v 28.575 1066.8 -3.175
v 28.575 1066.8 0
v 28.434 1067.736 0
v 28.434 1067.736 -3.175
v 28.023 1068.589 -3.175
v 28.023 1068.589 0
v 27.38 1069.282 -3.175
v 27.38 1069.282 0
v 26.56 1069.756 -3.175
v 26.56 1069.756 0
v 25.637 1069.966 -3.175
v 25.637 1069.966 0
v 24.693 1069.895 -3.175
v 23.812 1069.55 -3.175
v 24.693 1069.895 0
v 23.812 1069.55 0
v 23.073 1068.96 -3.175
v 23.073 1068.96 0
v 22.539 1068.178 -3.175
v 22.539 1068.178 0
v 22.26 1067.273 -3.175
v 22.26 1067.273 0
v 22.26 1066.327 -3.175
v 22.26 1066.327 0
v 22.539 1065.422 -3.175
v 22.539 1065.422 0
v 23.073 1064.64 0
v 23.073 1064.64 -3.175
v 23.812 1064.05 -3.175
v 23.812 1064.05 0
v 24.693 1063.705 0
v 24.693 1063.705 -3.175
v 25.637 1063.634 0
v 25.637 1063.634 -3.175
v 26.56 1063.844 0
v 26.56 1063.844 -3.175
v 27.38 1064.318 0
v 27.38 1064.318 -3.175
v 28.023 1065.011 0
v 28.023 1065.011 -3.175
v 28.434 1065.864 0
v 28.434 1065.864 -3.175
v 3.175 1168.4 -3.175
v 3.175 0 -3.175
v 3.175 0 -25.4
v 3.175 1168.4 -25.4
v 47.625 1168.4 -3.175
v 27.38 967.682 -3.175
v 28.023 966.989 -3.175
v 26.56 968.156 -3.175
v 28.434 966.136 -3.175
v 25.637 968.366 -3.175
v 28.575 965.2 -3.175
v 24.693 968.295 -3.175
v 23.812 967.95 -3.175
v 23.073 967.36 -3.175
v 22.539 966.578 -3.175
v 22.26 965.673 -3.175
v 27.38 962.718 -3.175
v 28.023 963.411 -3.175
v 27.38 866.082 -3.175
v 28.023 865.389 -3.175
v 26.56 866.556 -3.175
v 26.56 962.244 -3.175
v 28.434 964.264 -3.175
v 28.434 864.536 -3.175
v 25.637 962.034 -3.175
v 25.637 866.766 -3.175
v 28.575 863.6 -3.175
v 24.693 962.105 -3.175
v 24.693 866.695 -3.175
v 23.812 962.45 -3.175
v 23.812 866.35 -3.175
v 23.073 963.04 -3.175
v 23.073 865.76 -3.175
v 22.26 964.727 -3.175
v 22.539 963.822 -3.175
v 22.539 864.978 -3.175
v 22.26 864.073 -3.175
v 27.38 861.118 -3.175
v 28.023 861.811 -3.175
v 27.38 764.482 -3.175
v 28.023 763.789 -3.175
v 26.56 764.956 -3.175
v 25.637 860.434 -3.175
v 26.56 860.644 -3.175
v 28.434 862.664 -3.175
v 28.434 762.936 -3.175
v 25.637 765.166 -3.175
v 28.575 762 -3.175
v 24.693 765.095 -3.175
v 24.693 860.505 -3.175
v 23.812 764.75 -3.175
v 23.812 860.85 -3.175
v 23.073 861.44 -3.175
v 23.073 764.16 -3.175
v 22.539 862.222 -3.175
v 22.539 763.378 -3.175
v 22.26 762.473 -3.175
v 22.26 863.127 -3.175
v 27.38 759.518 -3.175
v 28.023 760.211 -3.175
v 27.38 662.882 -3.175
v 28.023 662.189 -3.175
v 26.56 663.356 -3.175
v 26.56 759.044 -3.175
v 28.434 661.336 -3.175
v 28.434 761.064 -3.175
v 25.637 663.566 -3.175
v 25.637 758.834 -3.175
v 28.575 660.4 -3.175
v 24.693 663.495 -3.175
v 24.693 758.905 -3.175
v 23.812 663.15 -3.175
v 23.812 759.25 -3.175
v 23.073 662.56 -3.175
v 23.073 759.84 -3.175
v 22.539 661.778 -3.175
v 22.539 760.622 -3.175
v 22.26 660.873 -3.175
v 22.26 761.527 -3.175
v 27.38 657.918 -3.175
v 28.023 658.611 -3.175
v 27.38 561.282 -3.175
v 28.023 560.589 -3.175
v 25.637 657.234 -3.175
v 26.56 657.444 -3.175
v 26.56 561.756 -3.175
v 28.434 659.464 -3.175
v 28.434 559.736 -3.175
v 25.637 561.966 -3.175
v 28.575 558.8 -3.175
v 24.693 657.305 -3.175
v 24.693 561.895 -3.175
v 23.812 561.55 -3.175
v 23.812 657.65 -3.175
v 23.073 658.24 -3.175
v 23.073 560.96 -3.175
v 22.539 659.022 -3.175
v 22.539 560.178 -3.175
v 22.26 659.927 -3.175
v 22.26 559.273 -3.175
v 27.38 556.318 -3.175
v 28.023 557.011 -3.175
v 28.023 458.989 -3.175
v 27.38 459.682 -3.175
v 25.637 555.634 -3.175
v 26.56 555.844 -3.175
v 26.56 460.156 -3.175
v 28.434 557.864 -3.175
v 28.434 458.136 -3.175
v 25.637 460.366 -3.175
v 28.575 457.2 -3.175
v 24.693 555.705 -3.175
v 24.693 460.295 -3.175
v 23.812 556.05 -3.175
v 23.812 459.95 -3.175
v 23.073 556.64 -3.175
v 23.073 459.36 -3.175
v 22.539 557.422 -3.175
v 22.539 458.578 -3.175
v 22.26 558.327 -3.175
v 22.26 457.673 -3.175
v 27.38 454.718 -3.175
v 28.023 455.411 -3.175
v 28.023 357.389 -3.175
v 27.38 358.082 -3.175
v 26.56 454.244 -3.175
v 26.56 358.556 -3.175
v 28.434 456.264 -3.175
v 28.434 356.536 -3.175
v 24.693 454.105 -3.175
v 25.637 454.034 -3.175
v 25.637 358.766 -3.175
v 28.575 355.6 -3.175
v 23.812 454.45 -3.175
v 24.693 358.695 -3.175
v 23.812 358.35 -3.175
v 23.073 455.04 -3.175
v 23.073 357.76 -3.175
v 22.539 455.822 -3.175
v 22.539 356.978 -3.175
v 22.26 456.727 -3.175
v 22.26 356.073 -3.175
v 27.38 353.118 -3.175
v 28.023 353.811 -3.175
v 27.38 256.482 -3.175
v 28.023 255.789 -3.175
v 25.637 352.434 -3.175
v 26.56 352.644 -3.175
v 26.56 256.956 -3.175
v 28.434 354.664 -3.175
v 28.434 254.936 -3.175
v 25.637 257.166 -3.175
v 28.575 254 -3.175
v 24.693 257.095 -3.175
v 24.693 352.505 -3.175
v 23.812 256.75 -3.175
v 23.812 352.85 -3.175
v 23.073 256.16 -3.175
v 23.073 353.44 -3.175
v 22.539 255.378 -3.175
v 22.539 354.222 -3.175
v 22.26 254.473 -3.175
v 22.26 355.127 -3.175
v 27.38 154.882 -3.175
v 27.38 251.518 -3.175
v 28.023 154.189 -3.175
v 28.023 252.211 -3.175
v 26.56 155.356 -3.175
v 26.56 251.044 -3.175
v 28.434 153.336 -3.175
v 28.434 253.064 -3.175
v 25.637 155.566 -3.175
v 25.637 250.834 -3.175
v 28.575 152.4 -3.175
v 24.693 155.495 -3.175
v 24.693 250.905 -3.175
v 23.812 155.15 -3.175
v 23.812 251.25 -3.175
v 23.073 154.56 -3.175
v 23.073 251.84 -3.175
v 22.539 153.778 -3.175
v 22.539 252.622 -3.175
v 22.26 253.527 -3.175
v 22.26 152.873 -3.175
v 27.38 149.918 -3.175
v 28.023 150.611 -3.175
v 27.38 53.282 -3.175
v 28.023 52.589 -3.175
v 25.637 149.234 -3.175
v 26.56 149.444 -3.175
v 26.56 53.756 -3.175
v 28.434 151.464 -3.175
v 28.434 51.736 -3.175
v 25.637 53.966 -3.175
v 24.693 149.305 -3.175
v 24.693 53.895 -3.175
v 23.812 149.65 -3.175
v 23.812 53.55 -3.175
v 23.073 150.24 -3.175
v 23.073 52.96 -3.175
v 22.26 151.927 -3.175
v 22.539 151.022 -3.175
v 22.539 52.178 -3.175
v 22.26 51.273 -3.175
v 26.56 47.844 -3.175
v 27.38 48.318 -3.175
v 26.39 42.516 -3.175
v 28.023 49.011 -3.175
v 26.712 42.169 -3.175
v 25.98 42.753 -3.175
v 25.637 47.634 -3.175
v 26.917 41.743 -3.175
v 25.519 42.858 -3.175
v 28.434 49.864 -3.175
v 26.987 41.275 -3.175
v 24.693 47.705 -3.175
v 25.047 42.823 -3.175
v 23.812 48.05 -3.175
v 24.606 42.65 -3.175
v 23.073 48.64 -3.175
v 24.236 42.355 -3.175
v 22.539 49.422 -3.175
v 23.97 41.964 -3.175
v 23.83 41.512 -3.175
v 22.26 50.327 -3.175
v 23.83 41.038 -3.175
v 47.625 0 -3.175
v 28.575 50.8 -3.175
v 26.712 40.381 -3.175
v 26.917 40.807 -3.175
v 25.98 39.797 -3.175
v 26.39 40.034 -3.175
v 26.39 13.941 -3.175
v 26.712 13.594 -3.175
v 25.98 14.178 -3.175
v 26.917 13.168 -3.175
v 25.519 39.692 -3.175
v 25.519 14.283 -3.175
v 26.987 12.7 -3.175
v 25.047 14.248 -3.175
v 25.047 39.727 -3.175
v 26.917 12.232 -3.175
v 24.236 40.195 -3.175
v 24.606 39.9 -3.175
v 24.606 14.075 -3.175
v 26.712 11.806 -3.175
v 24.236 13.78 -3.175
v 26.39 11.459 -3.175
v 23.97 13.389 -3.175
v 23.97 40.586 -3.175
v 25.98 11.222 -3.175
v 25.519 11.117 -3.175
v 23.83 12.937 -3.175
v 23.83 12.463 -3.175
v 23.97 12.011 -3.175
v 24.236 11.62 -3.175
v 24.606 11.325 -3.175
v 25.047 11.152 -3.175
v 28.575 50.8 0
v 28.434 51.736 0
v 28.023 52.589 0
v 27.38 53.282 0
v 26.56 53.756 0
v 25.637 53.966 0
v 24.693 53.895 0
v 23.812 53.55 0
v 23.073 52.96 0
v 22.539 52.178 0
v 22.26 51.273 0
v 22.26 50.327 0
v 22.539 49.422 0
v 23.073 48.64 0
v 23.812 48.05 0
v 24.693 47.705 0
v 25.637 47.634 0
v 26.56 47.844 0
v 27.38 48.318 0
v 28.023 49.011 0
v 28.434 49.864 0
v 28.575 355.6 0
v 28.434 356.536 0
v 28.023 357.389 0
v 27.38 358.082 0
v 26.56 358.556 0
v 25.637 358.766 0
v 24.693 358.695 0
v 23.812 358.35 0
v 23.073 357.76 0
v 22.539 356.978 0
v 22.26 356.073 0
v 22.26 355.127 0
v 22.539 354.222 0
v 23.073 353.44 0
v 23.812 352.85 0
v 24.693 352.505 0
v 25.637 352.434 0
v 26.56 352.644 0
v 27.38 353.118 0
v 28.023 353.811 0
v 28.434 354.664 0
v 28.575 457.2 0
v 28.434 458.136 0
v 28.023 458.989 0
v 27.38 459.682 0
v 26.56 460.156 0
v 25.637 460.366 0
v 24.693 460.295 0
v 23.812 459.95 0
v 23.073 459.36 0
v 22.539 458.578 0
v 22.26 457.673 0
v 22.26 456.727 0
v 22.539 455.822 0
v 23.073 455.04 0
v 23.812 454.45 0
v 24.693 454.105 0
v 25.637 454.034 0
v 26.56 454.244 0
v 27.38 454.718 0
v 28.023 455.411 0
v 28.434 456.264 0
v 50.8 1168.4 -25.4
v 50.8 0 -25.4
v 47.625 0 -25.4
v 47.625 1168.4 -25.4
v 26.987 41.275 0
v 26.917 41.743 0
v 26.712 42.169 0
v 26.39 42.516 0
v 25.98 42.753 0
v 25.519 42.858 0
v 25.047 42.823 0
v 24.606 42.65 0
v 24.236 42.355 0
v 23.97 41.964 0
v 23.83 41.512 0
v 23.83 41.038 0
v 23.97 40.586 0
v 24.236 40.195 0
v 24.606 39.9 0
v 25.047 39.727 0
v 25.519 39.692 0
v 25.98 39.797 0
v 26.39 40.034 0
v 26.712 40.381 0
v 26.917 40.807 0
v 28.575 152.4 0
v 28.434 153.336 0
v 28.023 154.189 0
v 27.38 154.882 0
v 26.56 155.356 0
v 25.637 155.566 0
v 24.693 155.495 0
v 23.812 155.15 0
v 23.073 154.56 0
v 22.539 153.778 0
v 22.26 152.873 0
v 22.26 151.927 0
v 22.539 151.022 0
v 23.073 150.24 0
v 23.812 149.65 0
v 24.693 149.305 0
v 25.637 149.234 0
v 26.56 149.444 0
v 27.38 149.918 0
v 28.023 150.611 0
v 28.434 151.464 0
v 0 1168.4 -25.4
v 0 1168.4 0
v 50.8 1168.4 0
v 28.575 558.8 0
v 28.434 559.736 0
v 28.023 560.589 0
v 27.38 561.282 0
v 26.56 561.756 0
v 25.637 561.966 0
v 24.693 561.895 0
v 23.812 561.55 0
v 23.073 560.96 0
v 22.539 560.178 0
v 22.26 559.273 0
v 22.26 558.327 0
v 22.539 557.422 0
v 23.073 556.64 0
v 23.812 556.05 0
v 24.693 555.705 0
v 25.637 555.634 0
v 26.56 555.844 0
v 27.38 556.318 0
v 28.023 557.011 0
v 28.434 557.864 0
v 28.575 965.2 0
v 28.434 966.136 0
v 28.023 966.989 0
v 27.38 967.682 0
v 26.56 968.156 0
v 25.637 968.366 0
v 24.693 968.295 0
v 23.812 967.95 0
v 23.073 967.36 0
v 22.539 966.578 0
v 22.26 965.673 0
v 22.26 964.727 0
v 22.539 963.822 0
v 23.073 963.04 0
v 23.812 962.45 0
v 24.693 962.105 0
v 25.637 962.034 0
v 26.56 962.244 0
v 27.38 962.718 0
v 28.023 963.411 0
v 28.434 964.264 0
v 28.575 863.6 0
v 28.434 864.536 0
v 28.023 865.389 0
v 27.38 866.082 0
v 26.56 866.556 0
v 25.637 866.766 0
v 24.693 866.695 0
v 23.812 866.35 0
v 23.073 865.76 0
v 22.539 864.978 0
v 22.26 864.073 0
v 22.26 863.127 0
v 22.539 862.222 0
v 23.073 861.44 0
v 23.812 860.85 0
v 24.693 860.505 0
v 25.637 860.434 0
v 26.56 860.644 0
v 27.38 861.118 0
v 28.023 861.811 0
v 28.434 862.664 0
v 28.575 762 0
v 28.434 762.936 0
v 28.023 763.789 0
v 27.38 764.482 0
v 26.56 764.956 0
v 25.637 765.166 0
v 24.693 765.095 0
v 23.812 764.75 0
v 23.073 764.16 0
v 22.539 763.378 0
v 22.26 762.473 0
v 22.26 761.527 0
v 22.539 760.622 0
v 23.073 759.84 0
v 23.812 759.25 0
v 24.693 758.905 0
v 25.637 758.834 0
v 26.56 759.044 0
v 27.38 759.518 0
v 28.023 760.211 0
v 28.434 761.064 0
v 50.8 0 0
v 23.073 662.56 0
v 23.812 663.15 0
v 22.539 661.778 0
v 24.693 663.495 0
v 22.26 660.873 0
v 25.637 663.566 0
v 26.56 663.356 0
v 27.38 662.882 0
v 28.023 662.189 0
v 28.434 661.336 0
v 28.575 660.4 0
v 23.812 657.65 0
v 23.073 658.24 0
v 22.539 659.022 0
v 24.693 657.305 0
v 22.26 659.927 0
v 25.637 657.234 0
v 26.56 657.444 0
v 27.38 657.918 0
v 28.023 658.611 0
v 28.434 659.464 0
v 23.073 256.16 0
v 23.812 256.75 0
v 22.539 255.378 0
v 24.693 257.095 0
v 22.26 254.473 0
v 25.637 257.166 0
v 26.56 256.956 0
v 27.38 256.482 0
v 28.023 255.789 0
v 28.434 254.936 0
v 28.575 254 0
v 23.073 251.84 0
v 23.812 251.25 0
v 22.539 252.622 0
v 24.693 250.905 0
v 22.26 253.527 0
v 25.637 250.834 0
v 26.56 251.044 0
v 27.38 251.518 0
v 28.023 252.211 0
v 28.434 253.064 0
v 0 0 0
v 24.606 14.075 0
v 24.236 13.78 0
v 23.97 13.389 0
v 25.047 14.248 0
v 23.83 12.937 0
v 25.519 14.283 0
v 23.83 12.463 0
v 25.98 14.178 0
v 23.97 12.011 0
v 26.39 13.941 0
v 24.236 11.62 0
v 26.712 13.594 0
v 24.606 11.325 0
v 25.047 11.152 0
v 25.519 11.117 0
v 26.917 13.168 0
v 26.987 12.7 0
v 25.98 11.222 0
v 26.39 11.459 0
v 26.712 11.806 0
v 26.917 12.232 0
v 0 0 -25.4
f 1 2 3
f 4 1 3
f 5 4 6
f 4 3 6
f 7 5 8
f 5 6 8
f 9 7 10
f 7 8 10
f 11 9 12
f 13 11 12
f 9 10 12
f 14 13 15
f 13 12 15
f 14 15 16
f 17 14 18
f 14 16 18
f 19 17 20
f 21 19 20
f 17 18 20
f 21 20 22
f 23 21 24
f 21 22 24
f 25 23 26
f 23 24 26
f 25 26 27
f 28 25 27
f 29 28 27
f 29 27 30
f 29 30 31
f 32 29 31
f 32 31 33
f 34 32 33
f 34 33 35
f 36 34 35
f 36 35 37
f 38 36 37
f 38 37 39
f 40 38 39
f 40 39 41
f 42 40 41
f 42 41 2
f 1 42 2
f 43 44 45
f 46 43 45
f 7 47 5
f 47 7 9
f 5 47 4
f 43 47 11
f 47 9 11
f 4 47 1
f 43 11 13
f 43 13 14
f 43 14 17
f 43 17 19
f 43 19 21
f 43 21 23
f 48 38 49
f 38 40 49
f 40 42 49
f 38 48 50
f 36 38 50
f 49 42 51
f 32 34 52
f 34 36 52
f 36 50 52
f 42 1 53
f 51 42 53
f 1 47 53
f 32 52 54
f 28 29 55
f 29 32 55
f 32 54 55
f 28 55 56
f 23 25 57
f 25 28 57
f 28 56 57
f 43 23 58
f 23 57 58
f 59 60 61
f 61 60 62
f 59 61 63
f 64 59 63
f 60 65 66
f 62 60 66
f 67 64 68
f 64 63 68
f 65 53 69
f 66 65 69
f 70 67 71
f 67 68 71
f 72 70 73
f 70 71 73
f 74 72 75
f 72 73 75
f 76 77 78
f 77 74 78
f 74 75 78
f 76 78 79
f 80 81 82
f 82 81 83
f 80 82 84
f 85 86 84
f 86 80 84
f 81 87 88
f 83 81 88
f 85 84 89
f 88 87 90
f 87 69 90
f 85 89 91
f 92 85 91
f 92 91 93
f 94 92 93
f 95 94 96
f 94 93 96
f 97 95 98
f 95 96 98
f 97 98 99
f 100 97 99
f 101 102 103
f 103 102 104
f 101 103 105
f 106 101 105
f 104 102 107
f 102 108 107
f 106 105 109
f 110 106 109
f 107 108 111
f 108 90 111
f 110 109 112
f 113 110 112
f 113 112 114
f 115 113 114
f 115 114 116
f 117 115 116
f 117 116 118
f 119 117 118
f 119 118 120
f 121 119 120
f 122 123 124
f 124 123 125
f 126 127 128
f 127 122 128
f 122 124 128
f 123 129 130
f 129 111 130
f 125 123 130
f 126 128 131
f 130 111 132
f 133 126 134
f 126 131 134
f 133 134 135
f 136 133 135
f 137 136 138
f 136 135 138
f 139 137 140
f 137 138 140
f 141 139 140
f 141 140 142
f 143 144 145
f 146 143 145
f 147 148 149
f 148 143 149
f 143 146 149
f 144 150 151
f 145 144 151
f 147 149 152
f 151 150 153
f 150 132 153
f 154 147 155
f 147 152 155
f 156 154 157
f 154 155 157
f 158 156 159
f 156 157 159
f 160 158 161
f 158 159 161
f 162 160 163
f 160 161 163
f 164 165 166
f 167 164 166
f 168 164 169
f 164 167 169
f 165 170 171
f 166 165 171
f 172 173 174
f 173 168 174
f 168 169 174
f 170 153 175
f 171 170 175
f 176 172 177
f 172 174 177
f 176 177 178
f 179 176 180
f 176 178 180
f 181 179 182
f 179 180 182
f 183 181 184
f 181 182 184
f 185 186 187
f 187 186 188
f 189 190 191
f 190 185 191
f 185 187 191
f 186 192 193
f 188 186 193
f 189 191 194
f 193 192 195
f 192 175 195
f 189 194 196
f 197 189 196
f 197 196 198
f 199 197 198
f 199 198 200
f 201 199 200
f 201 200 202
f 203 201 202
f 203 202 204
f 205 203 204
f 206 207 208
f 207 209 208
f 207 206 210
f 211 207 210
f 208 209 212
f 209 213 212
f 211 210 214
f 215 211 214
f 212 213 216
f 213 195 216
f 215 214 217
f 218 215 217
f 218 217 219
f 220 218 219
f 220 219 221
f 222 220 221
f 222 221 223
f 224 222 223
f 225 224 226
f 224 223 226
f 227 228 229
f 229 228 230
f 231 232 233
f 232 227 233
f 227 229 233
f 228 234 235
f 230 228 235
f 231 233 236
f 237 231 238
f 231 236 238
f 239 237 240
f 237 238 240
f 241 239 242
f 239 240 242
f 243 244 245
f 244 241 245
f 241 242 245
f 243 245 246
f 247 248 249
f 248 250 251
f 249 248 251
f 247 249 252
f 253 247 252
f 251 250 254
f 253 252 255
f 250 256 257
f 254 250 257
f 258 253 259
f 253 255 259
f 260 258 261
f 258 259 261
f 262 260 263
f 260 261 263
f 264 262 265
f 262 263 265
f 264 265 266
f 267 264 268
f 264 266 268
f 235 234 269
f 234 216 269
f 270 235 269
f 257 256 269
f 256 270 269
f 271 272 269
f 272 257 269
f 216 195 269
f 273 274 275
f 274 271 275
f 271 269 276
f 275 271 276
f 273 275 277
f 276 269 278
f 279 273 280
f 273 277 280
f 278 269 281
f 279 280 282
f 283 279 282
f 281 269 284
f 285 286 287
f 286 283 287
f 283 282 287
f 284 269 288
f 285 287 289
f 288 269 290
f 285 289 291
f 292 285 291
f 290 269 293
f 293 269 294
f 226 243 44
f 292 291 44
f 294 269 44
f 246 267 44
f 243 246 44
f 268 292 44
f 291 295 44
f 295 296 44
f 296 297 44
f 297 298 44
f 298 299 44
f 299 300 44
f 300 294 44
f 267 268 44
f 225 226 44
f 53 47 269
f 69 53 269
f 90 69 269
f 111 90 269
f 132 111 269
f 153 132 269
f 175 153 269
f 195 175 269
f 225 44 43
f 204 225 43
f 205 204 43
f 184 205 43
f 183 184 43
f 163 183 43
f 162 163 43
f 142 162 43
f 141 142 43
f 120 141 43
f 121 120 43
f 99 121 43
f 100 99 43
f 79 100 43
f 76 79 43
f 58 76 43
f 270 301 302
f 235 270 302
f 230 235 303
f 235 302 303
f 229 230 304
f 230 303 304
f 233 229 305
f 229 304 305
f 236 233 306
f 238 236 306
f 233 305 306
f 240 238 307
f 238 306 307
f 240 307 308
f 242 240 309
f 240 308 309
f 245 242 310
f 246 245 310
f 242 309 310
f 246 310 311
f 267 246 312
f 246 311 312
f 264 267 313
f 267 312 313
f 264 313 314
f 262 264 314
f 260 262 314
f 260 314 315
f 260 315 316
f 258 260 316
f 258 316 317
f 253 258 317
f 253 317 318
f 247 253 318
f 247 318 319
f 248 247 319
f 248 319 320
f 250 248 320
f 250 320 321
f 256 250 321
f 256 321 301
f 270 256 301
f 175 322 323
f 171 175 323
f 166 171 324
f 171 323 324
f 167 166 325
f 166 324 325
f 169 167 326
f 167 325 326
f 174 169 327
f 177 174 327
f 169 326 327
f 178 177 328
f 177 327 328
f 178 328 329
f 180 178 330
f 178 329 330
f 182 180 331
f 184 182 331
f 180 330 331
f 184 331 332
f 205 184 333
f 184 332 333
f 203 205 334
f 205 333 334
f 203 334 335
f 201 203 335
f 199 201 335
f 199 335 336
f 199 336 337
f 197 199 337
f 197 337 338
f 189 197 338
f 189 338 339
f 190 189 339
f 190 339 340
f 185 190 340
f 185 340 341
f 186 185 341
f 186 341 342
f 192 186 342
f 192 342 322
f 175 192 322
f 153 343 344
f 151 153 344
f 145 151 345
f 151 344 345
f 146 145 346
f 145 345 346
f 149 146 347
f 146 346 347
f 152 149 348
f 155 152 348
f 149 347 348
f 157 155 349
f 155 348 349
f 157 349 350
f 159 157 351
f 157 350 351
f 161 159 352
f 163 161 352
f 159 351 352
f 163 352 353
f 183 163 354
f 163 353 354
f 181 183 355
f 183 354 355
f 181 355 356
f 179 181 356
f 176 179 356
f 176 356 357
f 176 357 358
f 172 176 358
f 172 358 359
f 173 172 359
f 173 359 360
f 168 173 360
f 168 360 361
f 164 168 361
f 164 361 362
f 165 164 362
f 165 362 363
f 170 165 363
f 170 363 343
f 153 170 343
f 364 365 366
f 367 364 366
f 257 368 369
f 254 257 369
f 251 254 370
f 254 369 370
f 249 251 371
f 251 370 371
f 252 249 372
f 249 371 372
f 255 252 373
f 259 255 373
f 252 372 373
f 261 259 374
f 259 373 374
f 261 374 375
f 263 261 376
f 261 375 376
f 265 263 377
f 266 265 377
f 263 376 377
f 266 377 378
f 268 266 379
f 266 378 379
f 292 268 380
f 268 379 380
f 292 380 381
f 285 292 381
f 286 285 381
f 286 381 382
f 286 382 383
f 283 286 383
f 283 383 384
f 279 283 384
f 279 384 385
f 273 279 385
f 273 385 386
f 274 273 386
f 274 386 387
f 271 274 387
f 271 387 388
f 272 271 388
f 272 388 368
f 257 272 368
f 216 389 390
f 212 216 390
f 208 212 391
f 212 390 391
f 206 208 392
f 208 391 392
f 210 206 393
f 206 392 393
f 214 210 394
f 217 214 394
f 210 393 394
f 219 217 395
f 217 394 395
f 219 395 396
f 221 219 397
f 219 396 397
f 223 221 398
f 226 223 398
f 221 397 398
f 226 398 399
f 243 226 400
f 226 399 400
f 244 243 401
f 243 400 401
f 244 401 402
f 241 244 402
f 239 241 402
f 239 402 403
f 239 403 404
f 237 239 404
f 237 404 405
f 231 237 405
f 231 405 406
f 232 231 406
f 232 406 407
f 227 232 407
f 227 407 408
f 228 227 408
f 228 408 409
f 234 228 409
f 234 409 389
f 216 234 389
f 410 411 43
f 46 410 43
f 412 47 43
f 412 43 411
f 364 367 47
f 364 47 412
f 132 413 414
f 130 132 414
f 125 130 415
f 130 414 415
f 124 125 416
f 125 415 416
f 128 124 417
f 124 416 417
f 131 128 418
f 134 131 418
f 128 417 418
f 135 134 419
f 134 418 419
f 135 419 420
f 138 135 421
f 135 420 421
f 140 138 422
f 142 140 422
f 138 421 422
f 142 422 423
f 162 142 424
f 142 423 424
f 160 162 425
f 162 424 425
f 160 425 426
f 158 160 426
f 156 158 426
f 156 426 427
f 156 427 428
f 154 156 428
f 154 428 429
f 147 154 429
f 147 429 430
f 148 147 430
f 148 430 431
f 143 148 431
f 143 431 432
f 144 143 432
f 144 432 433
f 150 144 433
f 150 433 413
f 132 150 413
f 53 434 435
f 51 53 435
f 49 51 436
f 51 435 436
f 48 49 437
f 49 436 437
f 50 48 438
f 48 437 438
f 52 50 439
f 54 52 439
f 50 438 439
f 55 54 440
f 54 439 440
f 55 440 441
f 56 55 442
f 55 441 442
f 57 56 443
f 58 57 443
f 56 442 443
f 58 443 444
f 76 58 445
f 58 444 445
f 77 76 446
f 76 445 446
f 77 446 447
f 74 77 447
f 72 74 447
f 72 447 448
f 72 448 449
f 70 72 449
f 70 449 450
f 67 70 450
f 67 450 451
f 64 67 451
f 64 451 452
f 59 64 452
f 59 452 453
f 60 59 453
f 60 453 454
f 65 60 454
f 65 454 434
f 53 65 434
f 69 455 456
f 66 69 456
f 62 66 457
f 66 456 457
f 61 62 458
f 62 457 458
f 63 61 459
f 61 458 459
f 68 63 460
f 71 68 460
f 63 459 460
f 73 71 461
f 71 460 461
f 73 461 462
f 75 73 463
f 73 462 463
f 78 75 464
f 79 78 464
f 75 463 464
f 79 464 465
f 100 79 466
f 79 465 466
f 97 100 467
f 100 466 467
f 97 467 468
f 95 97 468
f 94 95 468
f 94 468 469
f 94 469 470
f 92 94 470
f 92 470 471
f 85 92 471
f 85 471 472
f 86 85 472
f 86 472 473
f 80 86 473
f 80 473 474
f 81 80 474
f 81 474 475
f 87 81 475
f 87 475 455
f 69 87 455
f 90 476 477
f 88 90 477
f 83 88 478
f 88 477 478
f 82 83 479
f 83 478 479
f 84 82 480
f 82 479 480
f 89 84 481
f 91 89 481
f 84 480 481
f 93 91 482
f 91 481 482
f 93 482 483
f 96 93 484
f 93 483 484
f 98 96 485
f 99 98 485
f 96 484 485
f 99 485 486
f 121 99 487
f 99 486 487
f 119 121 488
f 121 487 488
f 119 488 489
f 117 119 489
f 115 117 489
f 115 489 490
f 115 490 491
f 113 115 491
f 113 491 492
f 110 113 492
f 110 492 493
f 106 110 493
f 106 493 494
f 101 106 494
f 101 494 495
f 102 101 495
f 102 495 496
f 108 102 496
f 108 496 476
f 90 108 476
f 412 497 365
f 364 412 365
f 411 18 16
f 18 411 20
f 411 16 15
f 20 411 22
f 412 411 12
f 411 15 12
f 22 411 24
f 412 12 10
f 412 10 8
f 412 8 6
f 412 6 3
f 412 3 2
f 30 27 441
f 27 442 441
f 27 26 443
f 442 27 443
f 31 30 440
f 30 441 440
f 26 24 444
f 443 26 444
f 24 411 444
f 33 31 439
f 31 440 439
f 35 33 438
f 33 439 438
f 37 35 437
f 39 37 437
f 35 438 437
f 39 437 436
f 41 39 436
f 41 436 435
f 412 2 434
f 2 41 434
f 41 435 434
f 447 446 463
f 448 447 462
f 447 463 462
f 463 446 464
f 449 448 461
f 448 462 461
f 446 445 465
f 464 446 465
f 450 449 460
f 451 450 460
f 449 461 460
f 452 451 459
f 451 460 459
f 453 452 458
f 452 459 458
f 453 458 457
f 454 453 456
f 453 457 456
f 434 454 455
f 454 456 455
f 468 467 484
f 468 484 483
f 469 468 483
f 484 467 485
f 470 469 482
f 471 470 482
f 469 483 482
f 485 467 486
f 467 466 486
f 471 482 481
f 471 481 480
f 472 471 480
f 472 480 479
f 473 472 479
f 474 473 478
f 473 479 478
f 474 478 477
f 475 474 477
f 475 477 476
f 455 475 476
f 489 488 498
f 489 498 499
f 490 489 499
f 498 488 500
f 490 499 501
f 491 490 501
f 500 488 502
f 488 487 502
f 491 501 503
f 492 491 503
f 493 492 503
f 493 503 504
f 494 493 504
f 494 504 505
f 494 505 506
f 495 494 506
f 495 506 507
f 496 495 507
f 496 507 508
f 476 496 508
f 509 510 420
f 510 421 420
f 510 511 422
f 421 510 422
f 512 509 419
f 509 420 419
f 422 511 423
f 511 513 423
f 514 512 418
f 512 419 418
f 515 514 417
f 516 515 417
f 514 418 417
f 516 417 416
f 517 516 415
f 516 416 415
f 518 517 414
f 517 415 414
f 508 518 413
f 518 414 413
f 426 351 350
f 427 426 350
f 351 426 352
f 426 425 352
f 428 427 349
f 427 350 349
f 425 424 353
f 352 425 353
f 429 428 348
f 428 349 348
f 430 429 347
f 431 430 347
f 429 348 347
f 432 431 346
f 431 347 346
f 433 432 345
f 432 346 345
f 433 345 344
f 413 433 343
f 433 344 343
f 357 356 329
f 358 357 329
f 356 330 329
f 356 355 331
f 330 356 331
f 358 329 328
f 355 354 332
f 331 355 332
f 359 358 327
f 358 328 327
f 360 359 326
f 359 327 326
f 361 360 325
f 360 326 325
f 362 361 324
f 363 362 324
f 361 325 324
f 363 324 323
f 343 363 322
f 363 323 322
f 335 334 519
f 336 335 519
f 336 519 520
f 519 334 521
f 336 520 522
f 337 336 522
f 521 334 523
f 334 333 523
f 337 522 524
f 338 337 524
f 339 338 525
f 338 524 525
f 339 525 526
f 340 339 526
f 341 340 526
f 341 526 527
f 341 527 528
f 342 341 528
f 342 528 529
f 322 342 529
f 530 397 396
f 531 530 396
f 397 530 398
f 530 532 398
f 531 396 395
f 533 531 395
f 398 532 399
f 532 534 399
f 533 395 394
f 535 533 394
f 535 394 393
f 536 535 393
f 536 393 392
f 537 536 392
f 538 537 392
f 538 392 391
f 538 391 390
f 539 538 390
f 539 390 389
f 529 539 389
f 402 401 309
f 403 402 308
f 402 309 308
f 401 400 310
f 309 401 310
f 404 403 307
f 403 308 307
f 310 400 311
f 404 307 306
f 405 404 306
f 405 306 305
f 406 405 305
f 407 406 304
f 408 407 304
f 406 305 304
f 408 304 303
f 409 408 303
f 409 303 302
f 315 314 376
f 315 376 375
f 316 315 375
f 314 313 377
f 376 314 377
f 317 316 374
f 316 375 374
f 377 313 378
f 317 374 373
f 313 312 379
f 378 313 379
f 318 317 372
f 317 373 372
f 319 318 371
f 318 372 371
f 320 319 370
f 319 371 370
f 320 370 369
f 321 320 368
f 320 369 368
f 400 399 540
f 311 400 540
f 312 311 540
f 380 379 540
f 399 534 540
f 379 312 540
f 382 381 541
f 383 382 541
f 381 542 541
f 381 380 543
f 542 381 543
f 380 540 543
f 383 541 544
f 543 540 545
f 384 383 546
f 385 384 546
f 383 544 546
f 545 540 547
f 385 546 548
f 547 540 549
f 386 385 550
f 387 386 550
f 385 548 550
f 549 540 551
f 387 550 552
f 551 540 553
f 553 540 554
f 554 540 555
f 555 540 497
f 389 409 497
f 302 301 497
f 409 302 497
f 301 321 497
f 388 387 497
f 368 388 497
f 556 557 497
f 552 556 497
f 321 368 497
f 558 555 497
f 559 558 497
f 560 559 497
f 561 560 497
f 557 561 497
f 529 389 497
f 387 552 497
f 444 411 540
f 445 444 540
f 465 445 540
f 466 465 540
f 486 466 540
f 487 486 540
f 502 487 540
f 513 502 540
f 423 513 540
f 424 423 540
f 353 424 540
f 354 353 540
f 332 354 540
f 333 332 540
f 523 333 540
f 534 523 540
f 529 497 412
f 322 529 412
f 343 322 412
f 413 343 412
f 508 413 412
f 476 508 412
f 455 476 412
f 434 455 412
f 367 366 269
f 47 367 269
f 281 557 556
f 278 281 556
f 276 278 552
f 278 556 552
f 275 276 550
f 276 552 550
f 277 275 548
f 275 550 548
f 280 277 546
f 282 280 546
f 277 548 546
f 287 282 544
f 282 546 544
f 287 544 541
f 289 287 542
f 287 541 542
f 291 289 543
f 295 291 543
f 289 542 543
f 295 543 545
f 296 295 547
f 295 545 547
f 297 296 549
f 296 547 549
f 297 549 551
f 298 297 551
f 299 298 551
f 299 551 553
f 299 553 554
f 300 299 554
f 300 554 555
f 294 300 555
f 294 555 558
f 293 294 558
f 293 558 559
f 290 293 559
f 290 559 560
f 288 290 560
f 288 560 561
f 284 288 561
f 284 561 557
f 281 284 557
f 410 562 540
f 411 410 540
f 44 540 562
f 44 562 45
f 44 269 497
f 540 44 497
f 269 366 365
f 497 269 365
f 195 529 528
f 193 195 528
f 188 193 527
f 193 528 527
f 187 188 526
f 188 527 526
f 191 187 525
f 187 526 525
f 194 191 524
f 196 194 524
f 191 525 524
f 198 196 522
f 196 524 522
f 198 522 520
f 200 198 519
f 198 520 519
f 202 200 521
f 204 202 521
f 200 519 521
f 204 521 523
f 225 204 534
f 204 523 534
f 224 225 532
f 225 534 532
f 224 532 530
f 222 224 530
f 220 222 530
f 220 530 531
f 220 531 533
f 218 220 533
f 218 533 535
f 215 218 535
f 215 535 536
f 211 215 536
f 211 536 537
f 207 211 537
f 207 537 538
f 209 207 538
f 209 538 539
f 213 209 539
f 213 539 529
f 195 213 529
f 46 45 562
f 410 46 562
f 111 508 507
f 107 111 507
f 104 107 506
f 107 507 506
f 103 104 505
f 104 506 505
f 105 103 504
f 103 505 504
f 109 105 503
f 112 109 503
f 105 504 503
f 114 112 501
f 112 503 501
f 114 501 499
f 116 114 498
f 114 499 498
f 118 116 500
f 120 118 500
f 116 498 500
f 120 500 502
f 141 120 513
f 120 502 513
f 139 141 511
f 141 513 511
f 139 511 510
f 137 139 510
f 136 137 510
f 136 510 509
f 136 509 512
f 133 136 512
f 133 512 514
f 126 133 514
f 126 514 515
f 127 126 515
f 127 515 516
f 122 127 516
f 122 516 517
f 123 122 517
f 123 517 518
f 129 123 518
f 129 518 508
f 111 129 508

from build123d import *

# Parameters (mm, degrees)
BOSS_EXTRUDE1_DEPTH = 1168.4
CUT_EXTRUDE1_REACH  = 27.4
SKETCH2_R           = 3.175
CUT_EXTRUDE2_REACH  = 27.4
SKETCH4_R           = 1.5875


with BuildPart() as part:
    # Sketch1 → Boss-Extrude1 (new body)
    with BuildSketch(Plane(origin=(0, 0, 0), x_dir=(1, 0, 0), z_dir=(0, 1, 0))):
        Polygon((3.175, 3.175), (3.175, 25.4), (0, 25.4), (0, 0), (50.8, 0), (50.8, 25.4), (47.625, 25.4), (47.625, 3.175), align=None)
    extrude(amount=BOSS_EXTRUDE1_DEPTH)

    # Sketch2 → Cut-Extrude1 (cut, up to next)
    with BuildSketch(Plane.XY, mode=Mode.PRIVATE) as cut_extrude1_sk1:
        with Locations((25.4, 50.8)):
            Circle(SKETCH2_R)
    cut_extrude1_tool1 = extrude(cut_extrude1_sk1.sketch, amount=-CUT_EXTRUDE1_REACH, mode=Mode.PRIVATE) & part.part
    add(cut_extrude1_tool1.solids().sort_by_distance((25.4, 50.8, 0))[0], mode=Mode.SUBTRACT)
    # Sketch2 → Cut-Extrude1 (cut, up to next)
    with BuildSketch(Plane.XY, mode=Mode.PRIVATE) as cut_extrude1_sk2:
        with Locations((25.4, 152.4)):
            Circle(SKETCH2_R)
    cut_extrude1_tool2 = extrude(cut_extrude1_sk2.sketch, amount=-CUT_EXTRUDE1_REACH, mode=Mode.PRIVATE) & part.part
    add(cut_extrude1_tool2.solids().sort_by_distance((25.4, 152.4, 0))[0], mode=Mode.SUBTRACT)
    # Sketch2 → Cut-Extrude1 (cut, up to next)
    with BuildSketch(Plane.XY, mode=Mode.PRIVATE) as cut_extrude1_sk3:
        with Locations((25.4, 254)):
            Circle(SKETCH2_R)
    cut_extrude1_tool3 = extrude(cut_extrude1_sk3.sketch, amount=-CUT_EXTRUDE1_REACH, mode=Mode.PRIVATE) & part.part
    add(cut_extrude1_tool3.solids().sort_by_distance((25.4, 254, 0))[0], mode=Mode.SUBTRACT)
    # Sketch2 → Cut-Extrude1 (cut, up to next)
    with BuildSketch(Plane.XY, mode=Mode.PRIVATE) as cut_extrude1_sk4:
        with Locations((25.4, 355.6)):
            Circle(SKETCH2_R)
    cut_extrude1_tool4 = extrude(cut_extrude1_sk4.sketch, amount=-CUT_EXTRUDE1_REACH, mode=Mode.PRIVATE) & part.part
    add(cut_extrude1_tool4.solids().sort_by_distance((25.4, 355.6, 0))[0], mode=Mode.SUBTRACT)
    # Sketch2 → Cut-Extrude1 (cut, up to next)
    with BuildSketch(Plane.XY, mode=Mode.PRIVATE) as cut_extrude1_sk5:
        with Locations((25.4, 457.2)):
            Circle(SKETCH2_R)
    cut_extrude1_tool5 = extrude(cut_extrude1_sk5.sketch, amount=-CUT_EXTRUDE1_REACH, mode=Mode.PRIVATE) & part.part
    add(cut_extrude1_tool5.solids().sort_by_distance((25.4, 457.2, 0))[0], mode=Mode.SUBTRACT)
    # Sketch2 → Cut-Extrude1 (cut, up to next)
    with BuildSketch(Plane.XY, mode=Mode.PRIVATE) as cut_extrude1_sk6:
        with Locations((25.4, 558.8)):
            Circle(SKETCH2_R)
    cut_extrude1_tool6 = extrude(cut_extrude1_sk6.sketch, amount=-CUT_EXTRUDE1_REACH, mode=Mode.PRIVATE) & part.part
    add(cut_extrude1_tool6.solids().sort_by_distance((25.4, 558.8, 0))[0], mode=Mode.SUBTRACT)
    # Sketch2 → Cut-Extrude1 (cut, up to next)
    with BuildSketch(Plane.XY, mode=Mode.PRIVATE) as cut_extrude1_sk7:
        with Locations((25.4, 660.4)):
            Circle(SKETCH2_R)
    cut_extrude1_tool7 = extrude(cut_extrude1_sk7.sketch, amount=-CUT_EXTRUDE1_REACH, mode=Mode.PRIVATE) & part.part
    add(cut_extrude1_tool7.solids().sort_by_distance((25.4, 660.4, 0))[0], mode=Mode.SUBTRACT)
    # Sketch2 → Cut-Extrude1 (cut, up to next)
    with BuildSketch(Plane.XY, mode=Mode.PRIVATE) as cut_extrude1_sk8:
        with Locations((25.4, 762)):
            Circle(SKETCH2_R)
    cut_extrude1_tool8 = extrude(cut_extrude1_sk8.sketch, amount=-CUT_EXTRUDE1_REACH, mode=Mode.PRIVATE) & part.part
    add(cut_extrude1_tool8.solids().sort_by_distance((25.4, 762, 0))[0], mode=Mode.SUBTRACT)
    # Sketch2 → Cut-Extrude1 (cut, up to next)
    with BuildSketch(Plane.XY, mode=Mode.PRIVATE) as cut_extrude1_sk9:
        with Locations((25.4, 863.6)):
            Circle(SKETCH2_R)
    cut_extrude1_tool9 = extrude(cut_extrude1_sk9.sketch, amount=-CUT_EXTRUDE1_REACH, mode=Mode.PRIVATE) & part.part
    add(cut_extrude1_tool9.solids().sort_by_distance((25.4, 863.6, 0))[0], mode=Mode.SUBTRACT)
    # Sketch2 → Cut-Extrude1 (cut, up to next)
    with BuildSketch(Plane.XY, mode=Mode.PRIVATE) as cut_extrude1_sk10:
        with Locations((25.4, 965.2)):
            Circle(SKETCH2_R)
    cut_extrude1_tool10 = extrude(cut_extrude1_sk10.sketch, amount=-CUT_EXTRUDE1_REACH, mode=Mode.PRIVATE) & part.part
    add(cut_extrude1_tool10.solids().sort_by_distance((25.4, 965.2, 0))[0], mode=Mode.SUBTRACT)
    # Sketch2 → Cut-Extrude1 (cut, up to next)
    with BuildSketch(Plane.XY, mode=Mode.PRIVATE) as cut_extrude1_sk11:
        with Locations((25.4, 1066.8)):
            Circle(SKETCH2_R)
    cut_extrude1_tool11 = extrude(cut_extrude1_sk11.sketch, amount=-CUT_EXTRUDE1_REACH, mode=Mode.PRIVATE) & part.part
    add(cut_extrude1_tool11.solids().sort_by_distance((25.4, 1066.8, 0))[0], mode=Mode.SUBTRACT)

    # Sketch4 → Cut-Extrude2 (cut, up to next)
    with BuildSketch(Plane.XY, mode=Mode.PRIVATE) as cut_extrude2_sk1:
        with Locations((25.4, 41.275)):
            Circle(SKETCH4_R)
    cut_extrude2_tool1 = extrude(cut_extrude2_sk1.sketch, amount=-CUT_EXTRUDE2_REACH, mode=Mode.PRIVATE) & part.part
    add(cut_extrude2_tool1.solids().sort_by_distance((25.4, 41.275, 0))[0], mode=Mode.SUBTRACT)
    # Sketch4 → Cut-Extrude2 (cut, up to next)
    with BuildSketch(Plane.XY, mode=Mode.PRIVATE) as cut_extrude2_sk2:
        with Locations((25.4, 12.7)):
            Circle(SKETCH4_R)
    cut_extrude2_tool2 = extrude(cut_extrude2_sk2.sketch, amount=-CUT_EXTRUDE2_REACH, mode=Mode.PRIVATE) & part.part
    add(cut_extrude2_tool2.solids().sort_by_distance((25.4, 12.7, 0))[0], mode=Mode.SUBTRACT)


solid = part.part
